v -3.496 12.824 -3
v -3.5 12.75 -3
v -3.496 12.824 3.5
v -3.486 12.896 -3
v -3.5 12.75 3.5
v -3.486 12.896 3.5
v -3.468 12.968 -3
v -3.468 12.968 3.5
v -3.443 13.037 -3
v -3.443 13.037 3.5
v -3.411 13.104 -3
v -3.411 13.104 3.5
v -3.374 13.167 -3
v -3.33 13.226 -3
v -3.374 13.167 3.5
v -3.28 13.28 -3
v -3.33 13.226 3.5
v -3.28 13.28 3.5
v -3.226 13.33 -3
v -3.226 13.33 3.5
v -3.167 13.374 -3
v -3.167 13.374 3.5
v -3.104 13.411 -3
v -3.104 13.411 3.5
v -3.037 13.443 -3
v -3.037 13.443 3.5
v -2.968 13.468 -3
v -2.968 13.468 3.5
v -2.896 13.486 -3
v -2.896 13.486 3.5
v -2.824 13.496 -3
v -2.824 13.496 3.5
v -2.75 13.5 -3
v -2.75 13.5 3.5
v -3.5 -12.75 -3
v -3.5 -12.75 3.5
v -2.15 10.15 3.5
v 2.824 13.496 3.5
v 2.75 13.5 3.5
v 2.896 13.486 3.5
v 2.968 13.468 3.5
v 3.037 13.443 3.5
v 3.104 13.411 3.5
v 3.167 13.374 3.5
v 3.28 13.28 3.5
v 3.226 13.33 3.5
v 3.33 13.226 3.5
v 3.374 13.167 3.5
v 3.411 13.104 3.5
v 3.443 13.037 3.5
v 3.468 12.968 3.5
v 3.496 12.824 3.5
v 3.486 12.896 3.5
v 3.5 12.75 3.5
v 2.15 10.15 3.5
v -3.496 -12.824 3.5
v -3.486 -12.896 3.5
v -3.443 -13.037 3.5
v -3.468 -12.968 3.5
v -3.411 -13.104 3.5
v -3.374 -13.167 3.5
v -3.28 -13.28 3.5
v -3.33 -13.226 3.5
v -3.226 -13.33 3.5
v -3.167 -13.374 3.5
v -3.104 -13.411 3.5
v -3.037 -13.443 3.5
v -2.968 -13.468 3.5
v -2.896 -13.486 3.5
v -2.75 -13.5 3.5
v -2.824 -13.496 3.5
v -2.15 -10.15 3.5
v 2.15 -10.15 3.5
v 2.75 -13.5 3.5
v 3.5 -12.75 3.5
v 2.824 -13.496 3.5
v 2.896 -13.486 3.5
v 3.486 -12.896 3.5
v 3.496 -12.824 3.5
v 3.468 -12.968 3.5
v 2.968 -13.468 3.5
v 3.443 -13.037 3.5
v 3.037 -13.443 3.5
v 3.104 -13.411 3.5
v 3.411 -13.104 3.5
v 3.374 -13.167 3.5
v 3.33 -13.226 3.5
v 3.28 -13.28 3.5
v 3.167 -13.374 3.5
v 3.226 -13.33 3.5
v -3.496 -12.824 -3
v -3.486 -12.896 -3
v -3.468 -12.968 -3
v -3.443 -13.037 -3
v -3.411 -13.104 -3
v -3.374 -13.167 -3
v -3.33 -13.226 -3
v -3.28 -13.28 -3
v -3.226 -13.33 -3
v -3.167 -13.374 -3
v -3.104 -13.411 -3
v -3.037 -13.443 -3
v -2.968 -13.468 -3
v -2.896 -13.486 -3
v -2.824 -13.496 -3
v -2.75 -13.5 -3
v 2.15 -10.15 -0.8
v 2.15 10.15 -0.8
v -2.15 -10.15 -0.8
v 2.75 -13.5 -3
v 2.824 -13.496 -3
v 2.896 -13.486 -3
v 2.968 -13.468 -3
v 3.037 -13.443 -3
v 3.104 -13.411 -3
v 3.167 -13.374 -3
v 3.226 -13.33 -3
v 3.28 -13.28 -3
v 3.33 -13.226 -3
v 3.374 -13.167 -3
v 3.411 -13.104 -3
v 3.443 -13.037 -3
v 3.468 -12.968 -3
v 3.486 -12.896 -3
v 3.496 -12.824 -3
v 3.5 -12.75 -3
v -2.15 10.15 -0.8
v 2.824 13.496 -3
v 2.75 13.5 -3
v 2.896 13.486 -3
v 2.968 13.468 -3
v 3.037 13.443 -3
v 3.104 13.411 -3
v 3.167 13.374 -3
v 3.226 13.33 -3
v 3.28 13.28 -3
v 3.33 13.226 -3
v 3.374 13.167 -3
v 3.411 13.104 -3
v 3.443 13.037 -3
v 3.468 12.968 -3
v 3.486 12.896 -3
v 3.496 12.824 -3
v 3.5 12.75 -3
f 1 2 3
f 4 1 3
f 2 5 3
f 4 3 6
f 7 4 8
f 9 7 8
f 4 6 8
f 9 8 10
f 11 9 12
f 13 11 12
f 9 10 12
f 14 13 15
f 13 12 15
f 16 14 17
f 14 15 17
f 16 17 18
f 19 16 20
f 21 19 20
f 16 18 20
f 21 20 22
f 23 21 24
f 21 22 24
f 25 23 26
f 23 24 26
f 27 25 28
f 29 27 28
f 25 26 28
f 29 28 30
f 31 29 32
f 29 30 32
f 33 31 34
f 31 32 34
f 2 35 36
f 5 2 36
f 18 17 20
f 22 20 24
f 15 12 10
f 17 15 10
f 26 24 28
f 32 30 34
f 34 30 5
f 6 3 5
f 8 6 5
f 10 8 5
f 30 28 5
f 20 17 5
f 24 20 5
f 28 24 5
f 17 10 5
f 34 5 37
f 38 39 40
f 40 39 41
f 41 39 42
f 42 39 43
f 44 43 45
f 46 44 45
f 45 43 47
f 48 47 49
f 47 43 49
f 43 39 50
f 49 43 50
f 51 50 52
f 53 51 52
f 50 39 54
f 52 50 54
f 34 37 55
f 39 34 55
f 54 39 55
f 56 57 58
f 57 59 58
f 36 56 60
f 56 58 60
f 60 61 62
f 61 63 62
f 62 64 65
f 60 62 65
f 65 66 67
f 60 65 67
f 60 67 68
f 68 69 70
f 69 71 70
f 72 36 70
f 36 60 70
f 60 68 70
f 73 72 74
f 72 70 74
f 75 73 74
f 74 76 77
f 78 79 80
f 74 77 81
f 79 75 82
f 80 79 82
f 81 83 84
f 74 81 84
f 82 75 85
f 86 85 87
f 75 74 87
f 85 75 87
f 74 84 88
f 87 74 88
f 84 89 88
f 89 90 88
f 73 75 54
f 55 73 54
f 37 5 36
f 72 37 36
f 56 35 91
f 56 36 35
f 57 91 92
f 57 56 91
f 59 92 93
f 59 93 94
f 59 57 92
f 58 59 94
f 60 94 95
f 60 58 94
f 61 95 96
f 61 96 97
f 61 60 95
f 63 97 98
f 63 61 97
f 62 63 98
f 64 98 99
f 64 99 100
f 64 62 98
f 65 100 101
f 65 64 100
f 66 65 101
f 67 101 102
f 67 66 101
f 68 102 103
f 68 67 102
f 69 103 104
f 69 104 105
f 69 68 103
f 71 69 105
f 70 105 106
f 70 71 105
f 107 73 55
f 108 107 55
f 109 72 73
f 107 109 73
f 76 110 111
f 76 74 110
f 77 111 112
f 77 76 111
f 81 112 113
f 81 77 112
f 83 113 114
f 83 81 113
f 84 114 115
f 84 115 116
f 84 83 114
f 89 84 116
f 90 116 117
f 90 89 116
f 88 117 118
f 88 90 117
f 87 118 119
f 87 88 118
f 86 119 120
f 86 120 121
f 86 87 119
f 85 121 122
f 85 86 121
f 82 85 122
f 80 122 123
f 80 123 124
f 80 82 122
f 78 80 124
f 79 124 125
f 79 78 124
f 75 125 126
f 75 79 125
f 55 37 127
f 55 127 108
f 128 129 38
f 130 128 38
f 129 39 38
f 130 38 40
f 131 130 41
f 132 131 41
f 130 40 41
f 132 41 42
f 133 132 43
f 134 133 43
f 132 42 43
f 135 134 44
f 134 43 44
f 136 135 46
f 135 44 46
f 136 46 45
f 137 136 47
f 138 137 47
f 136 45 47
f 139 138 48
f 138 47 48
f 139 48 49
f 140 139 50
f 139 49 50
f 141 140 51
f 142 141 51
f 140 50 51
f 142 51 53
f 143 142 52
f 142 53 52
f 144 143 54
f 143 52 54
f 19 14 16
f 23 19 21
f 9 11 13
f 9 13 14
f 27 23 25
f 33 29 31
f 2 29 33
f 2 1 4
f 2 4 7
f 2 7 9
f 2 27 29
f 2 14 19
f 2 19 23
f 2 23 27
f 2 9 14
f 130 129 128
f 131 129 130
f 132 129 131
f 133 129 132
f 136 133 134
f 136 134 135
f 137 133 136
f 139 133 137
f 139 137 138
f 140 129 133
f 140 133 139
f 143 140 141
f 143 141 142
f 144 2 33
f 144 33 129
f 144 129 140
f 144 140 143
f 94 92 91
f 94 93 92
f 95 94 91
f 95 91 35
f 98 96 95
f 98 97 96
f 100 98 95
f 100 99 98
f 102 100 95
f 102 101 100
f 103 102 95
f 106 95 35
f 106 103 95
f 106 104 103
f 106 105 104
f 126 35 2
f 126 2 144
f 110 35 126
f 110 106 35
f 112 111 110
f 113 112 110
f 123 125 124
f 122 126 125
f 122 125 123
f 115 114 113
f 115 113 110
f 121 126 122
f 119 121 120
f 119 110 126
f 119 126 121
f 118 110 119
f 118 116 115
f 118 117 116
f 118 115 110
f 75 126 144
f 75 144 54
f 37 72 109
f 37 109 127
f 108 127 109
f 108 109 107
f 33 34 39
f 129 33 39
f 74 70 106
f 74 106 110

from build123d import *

# Parameters (mm, degrees)
F0_W     = 7
F0_H     = 7
F1_DEPTH = 13.5
F2_W     = 4.3
F2_H     = 20.3
F3_DEPTH = 4.3
F4_DEPTH = 0.5
F5_R     = 0.75


with BuildPart() as f1:
    # F0 (on Front) → F1 (new body, symmetric)
    with BuildSketch(Plane.XZ):
        Rectangle(F0_W, F0_H)
    extrude(amount=F1_DEPTH, both=True)

    # F2 (on face) → F3 (cut)
    with BuildSketch(Plane.XY.offset(3.5)):
        Rectangle(F2_W, F2_H)
    extrude(amount=-F3_DEPTH, mode=Mode.SUBTRACT)

    # F4 (cut): a face of the model
    f4_faces = [f1.faces().sort_by_distance(p)[0] for p in [
        (0, 0, -3.5),
    ]]
    extrude(f4_faces, amount=-F4_DEPTH, mode=Mode.SUBTRACT)

    # F5
    f5_edges = [f1.edges().sort_by_distance(p)[0] for p in [
        (-3.5, 13.5, 0.25),
        (3.5, 13.5, 0.25),
        (3.5, -13.5, 0.25),
        (-3.5, -13.5, 0.25),
    ]]
    fillet(f5_edges, radius=F5_R)


solid = f1.part
